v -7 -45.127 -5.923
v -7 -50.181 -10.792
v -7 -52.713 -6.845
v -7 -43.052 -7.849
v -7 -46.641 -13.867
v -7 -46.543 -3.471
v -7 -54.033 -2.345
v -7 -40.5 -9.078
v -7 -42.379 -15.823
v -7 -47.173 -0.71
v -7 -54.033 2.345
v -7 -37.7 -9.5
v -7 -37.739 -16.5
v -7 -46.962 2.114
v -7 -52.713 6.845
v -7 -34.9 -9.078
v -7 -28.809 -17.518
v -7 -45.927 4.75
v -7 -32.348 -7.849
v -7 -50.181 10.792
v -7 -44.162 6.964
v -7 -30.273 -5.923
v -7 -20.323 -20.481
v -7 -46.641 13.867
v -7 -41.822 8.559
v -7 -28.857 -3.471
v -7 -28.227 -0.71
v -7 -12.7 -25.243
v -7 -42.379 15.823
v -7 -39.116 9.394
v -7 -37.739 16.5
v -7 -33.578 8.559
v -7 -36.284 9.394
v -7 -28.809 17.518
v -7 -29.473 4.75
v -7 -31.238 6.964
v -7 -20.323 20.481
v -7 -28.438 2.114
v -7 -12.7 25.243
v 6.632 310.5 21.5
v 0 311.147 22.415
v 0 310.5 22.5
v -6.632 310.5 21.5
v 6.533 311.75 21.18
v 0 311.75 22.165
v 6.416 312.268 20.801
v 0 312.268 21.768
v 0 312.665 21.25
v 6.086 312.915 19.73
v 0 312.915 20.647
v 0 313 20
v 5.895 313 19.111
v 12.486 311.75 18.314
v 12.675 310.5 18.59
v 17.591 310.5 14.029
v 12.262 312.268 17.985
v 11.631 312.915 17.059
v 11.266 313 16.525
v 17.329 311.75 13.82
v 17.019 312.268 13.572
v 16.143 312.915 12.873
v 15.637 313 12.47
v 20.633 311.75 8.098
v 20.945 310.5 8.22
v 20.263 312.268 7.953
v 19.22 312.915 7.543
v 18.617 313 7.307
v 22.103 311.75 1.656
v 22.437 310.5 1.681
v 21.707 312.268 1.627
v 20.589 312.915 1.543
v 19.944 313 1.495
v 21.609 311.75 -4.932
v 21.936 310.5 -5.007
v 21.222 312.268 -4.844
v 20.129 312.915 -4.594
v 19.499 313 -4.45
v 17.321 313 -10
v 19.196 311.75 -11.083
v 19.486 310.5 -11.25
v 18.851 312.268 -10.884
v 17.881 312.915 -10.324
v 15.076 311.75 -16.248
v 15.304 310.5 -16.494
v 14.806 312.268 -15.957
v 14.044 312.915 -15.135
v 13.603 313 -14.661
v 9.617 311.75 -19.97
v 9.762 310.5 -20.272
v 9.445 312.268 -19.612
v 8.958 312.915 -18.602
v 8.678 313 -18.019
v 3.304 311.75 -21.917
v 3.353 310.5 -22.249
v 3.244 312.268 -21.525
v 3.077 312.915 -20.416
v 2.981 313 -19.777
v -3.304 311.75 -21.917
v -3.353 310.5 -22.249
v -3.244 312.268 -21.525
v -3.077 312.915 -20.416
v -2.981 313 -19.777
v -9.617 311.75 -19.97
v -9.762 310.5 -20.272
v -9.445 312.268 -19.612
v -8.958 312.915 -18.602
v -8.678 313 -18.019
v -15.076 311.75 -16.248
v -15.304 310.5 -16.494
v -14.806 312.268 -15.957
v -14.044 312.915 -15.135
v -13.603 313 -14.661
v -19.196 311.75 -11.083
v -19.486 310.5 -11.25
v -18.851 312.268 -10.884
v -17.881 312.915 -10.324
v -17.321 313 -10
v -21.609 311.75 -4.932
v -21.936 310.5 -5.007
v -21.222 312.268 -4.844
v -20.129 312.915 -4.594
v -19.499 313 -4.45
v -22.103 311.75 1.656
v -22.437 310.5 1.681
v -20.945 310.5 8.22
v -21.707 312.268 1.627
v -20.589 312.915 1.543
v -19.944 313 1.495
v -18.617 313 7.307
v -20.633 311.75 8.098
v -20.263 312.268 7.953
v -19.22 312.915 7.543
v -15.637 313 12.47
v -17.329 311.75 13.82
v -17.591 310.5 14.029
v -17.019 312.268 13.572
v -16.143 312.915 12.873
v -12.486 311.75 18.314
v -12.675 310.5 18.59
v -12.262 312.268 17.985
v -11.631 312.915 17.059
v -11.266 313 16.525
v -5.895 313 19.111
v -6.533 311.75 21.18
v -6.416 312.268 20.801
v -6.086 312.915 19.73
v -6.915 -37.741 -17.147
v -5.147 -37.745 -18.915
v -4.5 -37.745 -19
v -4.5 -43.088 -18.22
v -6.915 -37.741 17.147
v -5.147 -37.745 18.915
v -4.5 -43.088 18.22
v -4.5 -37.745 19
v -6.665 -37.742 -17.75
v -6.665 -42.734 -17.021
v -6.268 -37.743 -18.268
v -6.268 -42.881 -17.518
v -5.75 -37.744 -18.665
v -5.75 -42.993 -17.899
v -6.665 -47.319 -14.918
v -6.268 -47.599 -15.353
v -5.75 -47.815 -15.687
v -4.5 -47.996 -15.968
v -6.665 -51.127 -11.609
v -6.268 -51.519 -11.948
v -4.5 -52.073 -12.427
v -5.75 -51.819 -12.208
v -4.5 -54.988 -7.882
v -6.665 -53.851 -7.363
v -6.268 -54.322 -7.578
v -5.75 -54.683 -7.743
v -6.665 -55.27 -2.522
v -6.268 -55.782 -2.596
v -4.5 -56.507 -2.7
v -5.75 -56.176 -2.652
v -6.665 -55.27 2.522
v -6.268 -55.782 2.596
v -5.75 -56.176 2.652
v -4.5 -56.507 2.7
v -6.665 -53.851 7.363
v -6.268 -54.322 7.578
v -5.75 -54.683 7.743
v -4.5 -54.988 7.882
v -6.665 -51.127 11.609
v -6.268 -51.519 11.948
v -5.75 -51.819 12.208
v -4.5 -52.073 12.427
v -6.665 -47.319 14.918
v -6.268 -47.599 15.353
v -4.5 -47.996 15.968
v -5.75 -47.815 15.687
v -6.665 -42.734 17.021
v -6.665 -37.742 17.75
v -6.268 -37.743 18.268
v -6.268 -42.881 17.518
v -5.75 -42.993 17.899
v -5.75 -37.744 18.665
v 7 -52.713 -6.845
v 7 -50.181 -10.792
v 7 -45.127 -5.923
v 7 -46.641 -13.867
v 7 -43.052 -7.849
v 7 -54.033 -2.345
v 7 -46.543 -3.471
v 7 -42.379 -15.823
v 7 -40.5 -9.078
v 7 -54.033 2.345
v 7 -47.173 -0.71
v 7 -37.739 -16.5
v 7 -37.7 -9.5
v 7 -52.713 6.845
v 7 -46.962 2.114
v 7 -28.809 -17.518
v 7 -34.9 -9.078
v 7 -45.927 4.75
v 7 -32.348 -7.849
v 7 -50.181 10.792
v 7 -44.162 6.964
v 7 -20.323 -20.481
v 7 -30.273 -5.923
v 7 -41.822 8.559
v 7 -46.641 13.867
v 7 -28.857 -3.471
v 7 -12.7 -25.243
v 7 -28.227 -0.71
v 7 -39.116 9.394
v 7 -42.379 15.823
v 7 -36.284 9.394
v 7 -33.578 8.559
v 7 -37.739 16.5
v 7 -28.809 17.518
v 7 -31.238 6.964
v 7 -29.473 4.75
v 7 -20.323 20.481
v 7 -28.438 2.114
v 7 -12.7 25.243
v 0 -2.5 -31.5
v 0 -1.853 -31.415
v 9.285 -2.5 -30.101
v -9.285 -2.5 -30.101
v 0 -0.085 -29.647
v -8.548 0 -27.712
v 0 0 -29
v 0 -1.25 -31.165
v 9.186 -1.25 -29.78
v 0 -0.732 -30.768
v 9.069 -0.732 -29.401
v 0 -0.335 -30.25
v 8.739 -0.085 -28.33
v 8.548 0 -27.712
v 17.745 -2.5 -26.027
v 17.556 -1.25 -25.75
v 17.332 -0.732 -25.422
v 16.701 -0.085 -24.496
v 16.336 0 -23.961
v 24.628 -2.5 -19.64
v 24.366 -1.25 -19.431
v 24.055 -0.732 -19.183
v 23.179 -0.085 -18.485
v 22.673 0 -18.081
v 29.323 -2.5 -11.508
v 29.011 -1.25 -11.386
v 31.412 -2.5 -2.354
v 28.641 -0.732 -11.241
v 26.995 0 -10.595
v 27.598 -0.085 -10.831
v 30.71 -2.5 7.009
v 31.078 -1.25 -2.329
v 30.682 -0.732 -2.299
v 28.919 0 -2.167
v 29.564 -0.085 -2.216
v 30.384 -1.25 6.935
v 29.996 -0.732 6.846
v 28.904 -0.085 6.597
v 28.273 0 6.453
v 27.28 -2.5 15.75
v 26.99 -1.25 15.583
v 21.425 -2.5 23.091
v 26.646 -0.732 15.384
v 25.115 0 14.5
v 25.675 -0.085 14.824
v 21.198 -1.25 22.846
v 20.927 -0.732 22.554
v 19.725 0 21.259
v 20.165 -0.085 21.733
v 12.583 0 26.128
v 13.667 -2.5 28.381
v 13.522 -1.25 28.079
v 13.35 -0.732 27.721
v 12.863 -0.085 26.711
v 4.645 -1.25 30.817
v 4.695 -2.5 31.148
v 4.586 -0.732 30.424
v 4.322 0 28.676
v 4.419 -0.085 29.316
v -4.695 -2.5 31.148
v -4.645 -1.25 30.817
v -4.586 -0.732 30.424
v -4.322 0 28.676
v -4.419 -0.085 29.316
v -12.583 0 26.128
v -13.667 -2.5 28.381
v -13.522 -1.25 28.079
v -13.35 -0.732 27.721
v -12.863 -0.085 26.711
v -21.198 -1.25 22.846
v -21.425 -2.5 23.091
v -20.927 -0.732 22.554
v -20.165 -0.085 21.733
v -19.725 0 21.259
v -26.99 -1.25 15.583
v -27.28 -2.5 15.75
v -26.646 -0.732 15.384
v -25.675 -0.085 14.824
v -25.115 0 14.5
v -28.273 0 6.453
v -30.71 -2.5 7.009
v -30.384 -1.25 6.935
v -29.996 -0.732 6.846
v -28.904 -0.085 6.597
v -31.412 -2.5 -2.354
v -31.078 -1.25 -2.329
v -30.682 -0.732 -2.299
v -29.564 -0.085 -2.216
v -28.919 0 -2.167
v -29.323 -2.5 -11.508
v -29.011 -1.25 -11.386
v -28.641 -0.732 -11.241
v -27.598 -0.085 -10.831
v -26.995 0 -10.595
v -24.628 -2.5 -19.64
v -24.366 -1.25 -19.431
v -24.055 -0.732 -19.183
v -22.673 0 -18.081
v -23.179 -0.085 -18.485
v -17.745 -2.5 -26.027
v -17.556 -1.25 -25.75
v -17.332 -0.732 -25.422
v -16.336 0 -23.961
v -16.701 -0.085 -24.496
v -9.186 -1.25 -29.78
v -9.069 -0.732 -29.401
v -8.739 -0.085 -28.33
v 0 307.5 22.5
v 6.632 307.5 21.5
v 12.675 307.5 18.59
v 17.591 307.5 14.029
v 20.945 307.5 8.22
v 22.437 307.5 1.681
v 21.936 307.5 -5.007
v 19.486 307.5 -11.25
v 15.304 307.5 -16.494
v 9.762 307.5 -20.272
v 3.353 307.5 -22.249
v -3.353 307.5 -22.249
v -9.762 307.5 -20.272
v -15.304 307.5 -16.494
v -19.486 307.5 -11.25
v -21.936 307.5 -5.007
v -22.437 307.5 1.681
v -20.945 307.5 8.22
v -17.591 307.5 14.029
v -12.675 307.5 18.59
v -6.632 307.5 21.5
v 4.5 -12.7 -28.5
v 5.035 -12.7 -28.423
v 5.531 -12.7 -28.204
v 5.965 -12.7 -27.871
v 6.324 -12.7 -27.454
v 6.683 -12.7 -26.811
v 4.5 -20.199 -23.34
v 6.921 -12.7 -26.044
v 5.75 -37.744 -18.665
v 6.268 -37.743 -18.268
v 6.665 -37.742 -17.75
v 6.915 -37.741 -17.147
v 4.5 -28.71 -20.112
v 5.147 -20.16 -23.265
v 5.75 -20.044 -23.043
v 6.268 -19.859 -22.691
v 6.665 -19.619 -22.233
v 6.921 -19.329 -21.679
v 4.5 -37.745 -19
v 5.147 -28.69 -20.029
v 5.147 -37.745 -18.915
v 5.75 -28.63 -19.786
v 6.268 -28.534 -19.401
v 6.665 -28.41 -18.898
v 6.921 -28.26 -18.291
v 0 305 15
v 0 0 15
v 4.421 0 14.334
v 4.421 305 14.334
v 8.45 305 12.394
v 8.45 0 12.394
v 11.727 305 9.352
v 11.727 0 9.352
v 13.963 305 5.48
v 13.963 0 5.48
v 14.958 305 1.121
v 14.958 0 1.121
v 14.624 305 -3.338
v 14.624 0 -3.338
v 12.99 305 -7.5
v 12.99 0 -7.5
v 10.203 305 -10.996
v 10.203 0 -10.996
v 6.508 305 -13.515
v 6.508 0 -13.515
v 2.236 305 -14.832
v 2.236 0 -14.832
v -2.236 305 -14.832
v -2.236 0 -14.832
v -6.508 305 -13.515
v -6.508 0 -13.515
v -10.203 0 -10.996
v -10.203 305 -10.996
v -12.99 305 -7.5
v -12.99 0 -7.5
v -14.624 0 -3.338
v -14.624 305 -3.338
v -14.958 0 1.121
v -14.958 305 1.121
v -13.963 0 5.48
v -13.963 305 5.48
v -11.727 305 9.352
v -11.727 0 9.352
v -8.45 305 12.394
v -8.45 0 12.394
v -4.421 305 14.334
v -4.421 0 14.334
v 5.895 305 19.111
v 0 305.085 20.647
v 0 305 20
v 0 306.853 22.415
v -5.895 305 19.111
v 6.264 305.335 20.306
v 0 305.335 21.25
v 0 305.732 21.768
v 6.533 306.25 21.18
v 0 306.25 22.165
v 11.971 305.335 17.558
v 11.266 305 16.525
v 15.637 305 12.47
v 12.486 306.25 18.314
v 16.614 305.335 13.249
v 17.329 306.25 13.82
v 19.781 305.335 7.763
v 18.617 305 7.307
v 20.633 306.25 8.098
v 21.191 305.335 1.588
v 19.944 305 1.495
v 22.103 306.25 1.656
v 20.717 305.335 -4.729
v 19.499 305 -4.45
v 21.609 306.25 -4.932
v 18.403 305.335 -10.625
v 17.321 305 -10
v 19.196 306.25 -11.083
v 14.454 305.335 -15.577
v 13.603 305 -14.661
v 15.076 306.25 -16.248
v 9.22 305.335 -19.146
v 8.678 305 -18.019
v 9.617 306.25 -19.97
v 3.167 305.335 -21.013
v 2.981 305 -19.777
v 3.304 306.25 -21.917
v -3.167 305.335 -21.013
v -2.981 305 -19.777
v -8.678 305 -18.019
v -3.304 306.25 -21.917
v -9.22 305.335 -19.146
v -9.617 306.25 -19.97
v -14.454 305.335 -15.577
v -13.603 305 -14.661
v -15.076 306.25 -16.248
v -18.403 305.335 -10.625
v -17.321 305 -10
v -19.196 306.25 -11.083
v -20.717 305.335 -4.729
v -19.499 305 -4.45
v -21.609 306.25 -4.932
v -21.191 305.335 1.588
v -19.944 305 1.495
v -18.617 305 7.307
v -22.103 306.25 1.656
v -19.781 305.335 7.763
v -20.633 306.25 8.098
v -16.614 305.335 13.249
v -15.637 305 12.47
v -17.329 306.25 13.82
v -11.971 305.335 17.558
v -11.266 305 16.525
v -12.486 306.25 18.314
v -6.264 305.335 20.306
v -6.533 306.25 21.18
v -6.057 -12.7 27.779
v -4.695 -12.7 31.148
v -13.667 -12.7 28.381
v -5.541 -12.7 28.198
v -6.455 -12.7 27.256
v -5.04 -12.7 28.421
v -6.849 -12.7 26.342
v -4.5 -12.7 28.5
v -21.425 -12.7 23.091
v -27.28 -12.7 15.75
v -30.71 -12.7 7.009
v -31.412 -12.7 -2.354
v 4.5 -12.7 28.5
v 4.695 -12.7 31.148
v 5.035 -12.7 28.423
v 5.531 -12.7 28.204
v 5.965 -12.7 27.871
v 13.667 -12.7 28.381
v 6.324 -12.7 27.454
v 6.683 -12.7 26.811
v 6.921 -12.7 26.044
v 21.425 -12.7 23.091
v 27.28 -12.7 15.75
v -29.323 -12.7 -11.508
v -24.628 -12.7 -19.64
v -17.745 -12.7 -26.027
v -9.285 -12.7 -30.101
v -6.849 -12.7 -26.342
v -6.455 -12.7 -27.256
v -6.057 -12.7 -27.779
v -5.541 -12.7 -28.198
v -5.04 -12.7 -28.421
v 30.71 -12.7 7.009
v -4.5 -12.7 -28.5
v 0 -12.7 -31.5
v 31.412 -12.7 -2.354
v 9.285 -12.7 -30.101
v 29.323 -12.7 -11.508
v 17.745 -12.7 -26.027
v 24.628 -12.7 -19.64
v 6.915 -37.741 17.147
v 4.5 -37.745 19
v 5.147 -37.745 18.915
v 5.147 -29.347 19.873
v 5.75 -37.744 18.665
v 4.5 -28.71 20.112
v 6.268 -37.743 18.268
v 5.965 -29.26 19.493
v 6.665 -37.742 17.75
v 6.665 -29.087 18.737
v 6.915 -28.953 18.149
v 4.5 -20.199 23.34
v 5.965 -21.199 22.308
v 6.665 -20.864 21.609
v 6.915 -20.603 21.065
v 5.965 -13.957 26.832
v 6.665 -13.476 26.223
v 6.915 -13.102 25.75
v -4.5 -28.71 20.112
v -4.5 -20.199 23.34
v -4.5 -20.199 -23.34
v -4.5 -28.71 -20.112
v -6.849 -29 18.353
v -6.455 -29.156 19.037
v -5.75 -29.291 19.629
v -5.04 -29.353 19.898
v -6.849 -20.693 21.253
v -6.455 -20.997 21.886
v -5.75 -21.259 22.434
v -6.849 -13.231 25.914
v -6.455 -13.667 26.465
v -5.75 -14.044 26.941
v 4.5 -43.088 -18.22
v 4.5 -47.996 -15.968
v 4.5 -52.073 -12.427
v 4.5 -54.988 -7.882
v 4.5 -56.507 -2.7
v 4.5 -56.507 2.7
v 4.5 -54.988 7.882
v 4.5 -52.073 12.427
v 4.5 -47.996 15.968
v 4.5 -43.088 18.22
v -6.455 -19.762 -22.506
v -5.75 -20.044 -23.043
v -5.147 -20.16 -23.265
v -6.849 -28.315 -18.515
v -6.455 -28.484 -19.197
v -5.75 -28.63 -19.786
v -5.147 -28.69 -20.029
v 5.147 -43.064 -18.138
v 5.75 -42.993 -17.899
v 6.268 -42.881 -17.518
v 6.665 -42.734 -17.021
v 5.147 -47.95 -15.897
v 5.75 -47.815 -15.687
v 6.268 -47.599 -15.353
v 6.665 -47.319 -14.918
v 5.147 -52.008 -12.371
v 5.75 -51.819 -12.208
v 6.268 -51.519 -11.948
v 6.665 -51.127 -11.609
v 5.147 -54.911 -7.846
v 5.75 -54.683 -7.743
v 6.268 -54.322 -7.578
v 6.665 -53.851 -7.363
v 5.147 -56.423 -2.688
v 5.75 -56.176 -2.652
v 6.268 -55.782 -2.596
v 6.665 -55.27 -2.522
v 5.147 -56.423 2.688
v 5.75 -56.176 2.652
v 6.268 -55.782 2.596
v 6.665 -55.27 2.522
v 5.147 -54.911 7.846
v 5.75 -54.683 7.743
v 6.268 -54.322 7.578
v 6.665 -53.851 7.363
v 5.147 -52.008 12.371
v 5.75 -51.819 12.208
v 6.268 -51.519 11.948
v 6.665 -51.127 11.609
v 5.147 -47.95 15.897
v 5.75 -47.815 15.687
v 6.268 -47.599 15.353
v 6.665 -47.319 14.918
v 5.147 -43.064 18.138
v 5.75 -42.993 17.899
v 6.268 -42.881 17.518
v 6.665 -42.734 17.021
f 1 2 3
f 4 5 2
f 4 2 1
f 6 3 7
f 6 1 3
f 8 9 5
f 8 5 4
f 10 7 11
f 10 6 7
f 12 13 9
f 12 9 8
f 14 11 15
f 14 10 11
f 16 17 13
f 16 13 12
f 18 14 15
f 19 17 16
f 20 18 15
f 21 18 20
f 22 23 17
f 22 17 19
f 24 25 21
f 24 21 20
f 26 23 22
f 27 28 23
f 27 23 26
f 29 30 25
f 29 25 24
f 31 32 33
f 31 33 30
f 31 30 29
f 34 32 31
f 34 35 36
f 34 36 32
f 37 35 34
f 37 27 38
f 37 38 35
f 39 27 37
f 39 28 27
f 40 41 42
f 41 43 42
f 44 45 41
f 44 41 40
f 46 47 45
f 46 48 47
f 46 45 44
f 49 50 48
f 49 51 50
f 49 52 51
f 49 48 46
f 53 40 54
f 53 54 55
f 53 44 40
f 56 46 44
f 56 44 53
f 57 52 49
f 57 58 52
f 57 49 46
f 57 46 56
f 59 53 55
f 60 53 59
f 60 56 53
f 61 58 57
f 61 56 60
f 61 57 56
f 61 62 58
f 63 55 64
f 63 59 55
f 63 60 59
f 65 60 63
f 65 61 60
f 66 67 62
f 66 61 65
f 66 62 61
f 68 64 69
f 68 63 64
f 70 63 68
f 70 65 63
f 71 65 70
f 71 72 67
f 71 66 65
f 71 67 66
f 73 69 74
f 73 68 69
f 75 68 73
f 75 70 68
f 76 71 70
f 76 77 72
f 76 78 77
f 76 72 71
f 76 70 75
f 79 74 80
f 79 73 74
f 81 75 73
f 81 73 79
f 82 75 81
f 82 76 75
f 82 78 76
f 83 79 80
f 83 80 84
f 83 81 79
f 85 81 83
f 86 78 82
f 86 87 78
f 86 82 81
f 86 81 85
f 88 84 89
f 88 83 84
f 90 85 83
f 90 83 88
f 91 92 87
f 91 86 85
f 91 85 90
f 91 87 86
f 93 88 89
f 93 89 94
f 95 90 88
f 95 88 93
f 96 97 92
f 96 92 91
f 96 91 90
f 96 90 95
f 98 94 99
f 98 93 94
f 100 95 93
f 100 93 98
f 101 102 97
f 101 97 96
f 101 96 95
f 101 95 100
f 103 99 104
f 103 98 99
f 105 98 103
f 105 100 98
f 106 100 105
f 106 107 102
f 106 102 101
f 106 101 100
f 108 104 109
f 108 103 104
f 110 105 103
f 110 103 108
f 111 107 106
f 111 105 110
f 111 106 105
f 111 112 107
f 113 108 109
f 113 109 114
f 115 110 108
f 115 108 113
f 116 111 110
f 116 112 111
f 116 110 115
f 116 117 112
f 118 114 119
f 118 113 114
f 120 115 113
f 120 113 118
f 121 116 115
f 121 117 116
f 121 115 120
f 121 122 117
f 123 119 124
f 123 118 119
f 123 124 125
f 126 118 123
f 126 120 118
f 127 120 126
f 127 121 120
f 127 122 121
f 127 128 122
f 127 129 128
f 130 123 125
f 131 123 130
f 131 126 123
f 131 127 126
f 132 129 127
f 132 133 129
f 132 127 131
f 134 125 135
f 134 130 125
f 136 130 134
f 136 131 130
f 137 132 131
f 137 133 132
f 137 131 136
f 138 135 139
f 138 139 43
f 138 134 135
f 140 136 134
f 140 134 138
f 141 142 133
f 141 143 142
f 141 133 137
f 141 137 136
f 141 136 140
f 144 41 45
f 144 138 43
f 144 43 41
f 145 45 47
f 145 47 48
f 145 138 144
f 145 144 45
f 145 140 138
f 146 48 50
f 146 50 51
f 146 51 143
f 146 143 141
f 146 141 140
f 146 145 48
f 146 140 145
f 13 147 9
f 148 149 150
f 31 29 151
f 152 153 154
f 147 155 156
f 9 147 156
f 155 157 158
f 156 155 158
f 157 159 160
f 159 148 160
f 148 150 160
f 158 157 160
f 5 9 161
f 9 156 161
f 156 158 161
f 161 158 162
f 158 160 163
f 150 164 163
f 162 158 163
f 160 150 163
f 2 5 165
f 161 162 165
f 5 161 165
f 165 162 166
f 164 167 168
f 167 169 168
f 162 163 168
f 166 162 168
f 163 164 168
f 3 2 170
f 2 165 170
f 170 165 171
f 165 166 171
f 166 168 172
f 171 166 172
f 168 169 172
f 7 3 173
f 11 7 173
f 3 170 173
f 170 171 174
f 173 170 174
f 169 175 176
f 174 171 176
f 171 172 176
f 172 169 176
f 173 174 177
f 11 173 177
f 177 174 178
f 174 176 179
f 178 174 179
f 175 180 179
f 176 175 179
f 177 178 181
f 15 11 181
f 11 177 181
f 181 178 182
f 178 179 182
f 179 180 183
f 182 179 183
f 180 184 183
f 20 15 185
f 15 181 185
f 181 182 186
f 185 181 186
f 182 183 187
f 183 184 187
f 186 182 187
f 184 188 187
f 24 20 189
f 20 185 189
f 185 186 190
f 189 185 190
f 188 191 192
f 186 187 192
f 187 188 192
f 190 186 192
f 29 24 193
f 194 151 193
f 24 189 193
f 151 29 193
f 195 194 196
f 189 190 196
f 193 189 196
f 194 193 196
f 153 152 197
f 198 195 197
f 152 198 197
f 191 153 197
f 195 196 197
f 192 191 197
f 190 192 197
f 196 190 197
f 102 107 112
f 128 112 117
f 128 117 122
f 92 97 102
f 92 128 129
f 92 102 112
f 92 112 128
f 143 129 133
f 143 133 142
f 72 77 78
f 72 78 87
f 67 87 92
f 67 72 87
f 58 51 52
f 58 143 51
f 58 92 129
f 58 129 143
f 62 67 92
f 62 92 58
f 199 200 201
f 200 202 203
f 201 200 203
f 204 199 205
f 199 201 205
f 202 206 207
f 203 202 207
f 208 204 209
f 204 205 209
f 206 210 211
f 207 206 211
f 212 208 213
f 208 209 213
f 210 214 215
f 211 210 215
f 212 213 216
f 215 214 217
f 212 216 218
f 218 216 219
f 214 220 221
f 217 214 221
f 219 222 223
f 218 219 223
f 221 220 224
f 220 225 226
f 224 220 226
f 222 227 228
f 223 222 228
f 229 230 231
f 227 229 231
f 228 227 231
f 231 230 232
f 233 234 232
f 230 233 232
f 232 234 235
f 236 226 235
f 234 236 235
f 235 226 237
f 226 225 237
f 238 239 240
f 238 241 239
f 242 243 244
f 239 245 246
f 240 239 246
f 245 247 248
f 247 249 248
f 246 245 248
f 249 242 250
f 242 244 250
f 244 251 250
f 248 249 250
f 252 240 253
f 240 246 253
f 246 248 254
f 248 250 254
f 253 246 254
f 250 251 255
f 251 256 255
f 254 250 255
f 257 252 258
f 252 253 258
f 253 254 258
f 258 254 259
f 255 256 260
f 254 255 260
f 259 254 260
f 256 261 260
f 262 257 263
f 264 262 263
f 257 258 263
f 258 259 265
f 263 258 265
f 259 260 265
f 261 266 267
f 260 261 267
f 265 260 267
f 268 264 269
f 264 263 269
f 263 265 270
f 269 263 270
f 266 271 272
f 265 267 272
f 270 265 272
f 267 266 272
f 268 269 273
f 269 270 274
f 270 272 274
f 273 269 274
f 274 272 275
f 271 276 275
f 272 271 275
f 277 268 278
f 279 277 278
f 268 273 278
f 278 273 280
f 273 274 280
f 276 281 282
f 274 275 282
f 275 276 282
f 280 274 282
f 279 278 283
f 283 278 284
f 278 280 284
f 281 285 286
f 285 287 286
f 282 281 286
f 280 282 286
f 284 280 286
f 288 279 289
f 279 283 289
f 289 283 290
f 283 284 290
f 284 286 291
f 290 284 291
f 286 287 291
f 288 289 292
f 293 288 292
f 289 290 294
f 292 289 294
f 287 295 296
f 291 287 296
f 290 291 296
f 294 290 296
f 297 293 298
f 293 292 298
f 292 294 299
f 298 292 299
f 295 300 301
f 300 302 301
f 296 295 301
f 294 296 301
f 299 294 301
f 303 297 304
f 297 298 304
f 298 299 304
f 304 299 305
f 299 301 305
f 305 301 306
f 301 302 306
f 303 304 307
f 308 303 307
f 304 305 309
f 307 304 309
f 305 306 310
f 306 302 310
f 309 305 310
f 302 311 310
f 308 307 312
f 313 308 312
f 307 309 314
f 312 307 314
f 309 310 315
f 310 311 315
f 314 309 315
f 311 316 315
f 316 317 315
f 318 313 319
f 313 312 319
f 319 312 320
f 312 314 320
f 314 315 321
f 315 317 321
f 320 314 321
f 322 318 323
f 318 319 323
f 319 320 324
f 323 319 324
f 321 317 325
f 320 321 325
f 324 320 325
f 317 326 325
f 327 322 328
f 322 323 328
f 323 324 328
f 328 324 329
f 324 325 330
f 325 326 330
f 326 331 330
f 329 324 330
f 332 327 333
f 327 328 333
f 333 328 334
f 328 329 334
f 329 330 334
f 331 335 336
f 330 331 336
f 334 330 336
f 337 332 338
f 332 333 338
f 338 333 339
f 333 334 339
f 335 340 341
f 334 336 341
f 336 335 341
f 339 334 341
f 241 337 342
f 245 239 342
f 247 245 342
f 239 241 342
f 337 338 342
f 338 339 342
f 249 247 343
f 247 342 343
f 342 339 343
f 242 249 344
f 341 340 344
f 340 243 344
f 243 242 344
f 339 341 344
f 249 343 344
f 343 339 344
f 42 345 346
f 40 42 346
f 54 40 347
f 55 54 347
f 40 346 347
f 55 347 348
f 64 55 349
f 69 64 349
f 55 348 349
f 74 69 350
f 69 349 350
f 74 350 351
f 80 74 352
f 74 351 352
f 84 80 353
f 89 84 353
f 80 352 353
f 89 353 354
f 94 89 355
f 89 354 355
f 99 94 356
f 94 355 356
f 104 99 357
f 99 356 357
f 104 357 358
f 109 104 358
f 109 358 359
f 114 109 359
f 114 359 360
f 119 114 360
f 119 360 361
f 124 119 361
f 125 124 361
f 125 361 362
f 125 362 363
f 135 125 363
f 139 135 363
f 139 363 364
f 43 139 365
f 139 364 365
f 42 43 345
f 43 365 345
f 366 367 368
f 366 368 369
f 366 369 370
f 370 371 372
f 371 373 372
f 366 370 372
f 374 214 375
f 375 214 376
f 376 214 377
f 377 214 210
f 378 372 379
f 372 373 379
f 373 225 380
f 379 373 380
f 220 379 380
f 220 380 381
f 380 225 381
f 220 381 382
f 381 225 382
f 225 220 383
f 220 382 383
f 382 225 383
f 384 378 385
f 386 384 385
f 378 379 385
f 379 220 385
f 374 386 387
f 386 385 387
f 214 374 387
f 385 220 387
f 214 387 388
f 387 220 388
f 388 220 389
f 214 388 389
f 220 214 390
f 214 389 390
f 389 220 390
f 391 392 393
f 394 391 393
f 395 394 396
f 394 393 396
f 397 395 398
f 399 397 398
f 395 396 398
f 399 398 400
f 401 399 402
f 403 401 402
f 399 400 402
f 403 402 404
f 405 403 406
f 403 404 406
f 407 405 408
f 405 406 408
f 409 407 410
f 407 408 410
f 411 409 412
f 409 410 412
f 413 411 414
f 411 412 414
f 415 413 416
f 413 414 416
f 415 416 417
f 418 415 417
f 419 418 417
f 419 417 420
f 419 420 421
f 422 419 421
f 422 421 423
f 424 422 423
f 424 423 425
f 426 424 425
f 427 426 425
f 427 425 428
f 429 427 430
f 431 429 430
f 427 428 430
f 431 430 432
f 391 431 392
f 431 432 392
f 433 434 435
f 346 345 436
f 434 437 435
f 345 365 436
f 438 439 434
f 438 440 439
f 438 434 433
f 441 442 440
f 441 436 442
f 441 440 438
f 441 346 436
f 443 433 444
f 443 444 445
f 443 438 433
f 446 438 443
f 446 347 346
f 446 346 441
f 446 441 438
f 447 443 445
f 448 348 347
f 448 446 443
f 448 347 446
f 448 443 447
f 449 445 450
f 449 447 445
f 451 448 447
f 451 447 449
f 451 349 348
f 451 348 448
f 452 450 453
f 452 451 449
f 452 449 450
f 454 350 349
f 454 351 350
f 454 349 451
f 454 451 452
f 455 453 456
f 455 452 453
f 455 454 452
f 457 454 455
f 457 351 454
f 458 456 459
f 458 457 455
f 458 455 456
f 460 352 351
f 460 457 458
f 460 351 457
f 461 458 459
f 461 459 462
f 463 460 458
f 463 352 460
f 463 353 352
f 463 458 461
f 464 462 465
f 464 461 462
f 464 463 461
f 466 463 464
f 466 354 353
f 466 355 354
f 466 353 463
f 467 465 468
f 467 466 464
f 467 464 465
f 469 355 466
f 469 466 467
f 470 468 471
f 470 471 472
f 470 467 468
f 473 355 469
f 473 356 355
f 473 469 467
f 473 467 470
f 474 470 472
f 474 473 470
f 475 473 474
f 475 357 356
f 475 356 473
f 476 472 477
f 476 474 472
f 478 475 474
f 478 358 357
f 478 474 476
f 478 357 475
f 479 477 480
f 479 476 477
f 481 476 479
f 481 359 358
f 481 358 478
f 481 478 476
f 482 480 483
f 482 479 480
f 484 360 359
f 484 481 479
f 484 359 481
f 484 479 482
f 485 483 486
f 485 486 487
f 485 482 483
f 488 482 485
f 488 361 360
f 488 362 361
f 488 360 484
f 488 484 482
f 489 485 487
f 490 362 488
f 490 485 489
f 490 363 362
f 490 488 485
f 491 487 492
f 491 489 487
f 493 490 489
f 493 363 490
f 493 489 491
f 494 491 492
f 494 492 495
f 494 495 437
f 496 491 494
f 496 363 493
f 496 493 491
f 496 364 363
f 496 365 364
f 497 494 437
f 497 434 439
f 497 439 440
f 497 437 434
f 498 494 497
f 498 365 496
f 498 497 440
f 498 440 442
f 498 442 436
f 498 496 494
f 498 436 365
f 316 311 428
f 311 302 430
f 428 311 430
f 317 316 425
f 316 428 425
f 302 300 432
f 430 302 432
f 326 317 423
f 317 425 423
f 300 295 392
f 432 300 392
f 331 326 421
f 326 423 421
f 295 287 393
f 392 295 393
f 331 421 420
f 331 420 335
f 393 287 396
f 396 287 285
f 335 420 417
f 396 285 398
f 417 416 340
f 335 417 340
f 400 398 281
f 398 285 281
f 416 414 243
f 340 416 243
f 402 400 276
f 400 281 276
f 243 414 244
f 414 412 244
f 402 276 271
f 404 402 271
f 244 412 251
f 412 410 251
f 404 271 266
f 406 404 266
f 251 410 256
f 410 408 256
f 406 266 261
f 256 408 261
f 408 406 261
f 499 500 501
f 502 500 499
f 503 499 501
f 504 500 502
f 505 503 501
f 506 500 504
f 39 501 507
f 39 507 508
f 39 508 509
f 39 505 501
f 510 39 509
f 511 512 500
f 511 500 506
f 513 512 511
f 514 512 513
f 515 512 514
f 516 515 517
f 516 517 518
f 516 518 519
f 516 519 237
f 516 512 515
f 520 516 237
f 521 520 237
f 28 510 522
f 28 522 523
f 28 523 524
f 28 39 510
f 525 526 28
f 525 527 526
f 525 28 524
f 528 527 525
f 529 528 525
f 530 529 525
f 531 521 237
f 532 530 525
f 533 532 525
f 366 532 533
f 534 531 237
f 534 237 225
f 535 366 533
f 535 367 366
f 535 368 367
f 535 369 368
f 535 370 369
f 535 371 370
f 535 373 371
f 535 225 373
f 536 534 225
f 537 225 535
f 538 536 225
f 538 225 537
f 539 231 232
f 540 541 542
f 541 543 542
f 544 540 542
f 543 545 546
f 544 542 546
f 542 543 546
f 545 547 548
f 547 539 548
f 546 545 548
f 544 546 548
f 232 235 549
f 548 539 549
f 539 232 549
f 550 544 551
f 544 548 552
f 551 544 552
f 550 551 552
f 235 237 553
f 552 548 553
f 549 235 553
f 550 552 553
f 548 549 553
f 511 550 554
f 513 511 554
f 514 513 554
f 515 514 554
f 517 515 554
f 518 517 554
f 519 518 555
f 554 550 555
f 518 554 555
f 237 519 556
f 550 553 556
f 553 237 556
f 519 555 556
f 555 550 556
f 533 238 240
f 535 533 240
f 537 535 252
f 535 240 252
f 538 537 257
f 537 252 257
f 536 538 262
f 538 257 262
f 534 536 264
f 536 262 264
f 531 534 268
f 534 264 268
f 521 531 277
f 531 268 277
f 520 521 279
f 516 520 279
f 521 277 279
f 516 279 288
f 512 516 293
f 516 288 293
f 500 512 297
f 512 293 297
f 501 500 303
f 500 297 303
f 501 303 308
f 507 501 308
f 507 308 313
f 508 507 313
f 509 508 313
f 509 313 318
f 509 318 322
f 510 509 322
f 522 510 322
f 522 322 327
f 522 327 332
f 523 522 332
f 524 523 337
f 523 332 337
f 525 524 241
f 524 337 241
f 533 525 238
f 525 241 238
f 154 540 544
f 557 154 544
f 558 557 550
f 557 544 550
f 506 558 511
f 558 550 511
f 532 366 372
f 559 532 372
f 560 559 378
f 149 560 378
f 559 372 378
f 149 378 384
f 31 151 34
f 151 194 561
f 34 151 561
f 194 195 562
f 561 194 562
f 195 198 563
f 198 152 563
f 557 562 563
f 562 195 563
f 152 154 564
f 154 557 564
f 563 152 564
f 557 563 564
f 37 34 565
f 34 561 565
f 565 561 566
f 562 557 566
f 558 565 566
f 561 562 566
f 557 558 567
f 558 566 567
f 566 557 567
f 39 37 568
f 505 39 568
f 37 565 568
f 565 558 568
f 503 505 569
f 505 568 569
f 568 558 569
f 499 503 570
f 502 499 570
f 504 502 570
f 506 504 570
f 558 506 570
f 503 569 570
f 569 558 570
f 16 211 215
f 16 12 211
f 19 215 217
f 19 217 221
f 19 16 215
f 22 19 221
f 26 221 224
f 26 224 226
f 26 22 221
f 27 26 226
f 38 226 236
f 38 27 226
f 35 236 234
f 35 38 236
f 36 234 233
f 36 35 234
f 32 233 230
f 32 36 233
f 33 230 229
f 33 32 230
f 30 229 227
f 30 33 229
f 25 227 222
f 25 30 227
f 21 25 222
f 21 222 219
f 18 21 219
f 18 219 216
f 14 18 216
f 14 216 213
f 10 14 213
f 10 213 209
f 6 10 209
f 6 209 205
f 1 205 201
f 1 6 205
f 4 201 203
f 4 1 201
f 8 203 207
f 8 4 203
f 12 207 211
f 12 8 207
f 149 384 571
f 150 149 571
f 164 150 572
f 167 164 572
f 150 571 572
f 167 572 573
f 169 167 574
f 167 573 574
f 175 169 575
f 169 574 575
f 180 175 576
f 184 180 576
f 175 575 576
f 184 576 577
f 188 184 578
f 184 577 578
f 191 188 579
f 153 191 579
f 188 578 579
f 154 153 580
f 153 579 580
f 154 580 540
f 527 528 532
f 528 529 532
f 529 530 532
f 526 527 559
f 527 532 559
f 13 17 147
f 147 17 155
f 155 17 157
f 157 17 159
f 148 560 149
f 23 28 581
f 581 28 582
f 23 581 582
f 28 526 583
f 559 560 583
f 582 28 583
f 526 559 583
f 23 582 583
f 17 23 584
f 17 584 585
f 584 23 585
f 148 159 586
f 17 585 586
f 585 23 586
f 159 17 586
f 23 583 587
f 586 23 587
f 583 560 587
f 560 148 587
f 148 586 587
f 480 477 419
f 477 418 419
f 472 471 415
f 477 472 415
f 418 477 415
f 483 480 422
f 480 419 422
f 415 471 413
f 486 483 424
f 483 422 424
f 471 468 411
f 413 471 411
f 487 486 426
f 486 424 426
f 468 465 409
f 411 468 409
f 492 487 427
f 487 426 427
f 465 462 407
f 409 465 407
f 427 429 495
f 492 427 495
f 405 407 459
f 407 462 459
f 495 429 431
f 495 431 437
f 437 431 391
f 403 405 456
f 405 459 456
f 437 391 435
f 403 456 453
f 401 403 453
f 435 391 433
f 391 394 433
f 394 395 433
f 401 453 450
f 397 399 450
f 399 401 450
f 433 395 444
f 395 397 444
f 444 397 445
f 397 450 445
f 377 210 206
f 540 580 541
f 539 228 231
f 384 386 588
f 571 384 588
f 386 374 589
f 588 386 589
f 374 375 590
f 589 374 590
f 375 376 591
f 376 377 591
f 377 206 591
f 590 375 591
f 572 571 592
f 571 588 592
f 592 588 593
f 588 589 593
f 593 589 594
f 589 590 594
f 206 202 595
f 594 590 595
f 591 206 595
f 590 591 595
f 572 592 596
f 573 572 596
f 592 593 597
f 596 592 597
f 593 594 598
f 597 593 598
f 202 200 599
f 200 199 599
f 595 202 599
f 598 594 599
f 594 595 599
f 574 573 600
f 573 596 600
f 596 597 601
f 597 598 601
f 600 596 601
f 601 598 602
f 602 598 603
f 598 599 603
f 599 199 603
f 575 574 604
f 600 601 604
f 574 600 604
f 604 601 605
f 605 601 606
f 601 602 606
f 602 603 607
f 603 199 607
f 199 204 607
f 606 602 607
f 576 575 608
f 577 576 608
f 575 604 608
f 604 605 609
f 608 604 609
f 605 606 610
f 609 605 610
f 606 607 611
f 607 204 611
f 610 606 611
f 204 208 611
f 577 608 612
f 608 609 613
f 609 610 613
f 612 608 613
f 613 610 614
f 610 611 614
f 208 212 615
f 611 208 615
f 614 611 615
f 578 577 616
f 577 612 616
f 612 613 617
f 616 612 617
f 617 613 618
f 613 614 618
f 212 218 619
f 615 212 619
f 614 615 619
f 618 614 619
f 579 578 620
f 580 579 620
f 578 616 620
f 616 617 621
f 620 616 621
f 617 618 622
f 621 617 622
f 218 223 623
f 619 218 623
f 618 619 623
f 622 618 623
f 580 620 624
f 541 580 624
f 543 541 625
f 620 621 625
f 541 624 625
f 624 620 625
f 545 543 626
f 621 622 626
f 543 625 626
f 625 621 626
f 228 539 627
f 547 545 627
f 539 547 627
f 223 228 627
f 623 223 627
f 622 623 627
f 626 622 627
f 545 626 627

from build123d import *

# Parameters (mm, degrees)
SKETCH1_R           = 15
BOSS_EXTRUDE1_DEPTH = 305
SKETCH2_R           = 22.5
BOSS_EXTRUDE2_DEPTH = 8
SKETCH3_R           = 31.5
BOSS_EXTRUDE3_DEPTH = 12.7
SKETCH4_R           = 9.5
BOSS_EXTRUDE5_DEPTH = 7
FILLET1_R           = 2.5


with BuildPart() as part:
    # Sketch1 → Boss-Extrude1 (new body)
    with BuildSketch(Plane(origin=(0, 0, 0), x_dir=(1, 0, 0), z_dir=(0, 1, 0))):
        with Locations(Location((0, 0, 0), (0, 0, 270))):
            Circle(SKETCH1_R)
    extrude(amount=BOSS_EXTRUDE1_DEPTH)

    # Sketch2 → Boss-Extrude2 (add)
    with BuildSketch(Plane(origin=(0, 305, 0), x_dir=(1, 0, 0), z_dir=(0, 1, 0))):
        with Locations(Location((0, 0, 0), (0, 0, 270))):
            Circle(SKETCH2_R)
    extrude(amount=BOSS_EXTRUDE2_DEPTH)

    # Sketch3 → Boss-Extrude3 (add)
    with BuildSketch(Plane.XZ):
        with Locations(Location((0, 0, 0), (0, 0, 270))):
            Circle(SKETCH3_R)
    extrude(amount=BOSS_EXTRUDE3_DEPTH)

    # Sketch4 → Boss-Extrude5 (add, symmetric)
    with BuildSketch(Plane(origin=(0, 0, 0), x_dir=(0, 0, -1), z_dir=(1, 0, 0))):
        with BuildLine():
            Line((-28.5, -12.7), (28.5, -12.7))
            ThreePointArc((28.5, -12.7), (21.470051482, -24.357649102), (18.999946854, -37.744939413))
            ThreePointArc((18.999946854, -37.744939413), (0, -56.7), (-18.999946854, -37.744939413))
            ThreePointArc((-18.999946854, -37.744939413), (-21.470051482, -24.357649102), (-28.5, -12.7))
        make_face()
        with Locations((0, -37.7)):
            Circle(SKETCH4_R, mode=Mode.SUBTRACT)
    extrude(amount=BOSS_EXTRUDE5_DEPTH, both=True)

    # Fillet1
    fillet1_edges = [part.edges().sort_by_distance(p)[0] for p in [
        (0, 0, 31.5),
        (7, -24.357649102, -21.470051482),
        (7, -24.357649102, 21.470051482),
        (7, -56.7, 0),
        (-7, -24.357649102, -21.470051482),
        (-7, -24.357649102, 21.470051482),
        (-7, -56.7, 0),
        (0, 305, -22.5),
        (0, 313, -22.5),
    ]]
    fillet(fillet1_edges, radius=FILLET1_R)


solid = part.part
